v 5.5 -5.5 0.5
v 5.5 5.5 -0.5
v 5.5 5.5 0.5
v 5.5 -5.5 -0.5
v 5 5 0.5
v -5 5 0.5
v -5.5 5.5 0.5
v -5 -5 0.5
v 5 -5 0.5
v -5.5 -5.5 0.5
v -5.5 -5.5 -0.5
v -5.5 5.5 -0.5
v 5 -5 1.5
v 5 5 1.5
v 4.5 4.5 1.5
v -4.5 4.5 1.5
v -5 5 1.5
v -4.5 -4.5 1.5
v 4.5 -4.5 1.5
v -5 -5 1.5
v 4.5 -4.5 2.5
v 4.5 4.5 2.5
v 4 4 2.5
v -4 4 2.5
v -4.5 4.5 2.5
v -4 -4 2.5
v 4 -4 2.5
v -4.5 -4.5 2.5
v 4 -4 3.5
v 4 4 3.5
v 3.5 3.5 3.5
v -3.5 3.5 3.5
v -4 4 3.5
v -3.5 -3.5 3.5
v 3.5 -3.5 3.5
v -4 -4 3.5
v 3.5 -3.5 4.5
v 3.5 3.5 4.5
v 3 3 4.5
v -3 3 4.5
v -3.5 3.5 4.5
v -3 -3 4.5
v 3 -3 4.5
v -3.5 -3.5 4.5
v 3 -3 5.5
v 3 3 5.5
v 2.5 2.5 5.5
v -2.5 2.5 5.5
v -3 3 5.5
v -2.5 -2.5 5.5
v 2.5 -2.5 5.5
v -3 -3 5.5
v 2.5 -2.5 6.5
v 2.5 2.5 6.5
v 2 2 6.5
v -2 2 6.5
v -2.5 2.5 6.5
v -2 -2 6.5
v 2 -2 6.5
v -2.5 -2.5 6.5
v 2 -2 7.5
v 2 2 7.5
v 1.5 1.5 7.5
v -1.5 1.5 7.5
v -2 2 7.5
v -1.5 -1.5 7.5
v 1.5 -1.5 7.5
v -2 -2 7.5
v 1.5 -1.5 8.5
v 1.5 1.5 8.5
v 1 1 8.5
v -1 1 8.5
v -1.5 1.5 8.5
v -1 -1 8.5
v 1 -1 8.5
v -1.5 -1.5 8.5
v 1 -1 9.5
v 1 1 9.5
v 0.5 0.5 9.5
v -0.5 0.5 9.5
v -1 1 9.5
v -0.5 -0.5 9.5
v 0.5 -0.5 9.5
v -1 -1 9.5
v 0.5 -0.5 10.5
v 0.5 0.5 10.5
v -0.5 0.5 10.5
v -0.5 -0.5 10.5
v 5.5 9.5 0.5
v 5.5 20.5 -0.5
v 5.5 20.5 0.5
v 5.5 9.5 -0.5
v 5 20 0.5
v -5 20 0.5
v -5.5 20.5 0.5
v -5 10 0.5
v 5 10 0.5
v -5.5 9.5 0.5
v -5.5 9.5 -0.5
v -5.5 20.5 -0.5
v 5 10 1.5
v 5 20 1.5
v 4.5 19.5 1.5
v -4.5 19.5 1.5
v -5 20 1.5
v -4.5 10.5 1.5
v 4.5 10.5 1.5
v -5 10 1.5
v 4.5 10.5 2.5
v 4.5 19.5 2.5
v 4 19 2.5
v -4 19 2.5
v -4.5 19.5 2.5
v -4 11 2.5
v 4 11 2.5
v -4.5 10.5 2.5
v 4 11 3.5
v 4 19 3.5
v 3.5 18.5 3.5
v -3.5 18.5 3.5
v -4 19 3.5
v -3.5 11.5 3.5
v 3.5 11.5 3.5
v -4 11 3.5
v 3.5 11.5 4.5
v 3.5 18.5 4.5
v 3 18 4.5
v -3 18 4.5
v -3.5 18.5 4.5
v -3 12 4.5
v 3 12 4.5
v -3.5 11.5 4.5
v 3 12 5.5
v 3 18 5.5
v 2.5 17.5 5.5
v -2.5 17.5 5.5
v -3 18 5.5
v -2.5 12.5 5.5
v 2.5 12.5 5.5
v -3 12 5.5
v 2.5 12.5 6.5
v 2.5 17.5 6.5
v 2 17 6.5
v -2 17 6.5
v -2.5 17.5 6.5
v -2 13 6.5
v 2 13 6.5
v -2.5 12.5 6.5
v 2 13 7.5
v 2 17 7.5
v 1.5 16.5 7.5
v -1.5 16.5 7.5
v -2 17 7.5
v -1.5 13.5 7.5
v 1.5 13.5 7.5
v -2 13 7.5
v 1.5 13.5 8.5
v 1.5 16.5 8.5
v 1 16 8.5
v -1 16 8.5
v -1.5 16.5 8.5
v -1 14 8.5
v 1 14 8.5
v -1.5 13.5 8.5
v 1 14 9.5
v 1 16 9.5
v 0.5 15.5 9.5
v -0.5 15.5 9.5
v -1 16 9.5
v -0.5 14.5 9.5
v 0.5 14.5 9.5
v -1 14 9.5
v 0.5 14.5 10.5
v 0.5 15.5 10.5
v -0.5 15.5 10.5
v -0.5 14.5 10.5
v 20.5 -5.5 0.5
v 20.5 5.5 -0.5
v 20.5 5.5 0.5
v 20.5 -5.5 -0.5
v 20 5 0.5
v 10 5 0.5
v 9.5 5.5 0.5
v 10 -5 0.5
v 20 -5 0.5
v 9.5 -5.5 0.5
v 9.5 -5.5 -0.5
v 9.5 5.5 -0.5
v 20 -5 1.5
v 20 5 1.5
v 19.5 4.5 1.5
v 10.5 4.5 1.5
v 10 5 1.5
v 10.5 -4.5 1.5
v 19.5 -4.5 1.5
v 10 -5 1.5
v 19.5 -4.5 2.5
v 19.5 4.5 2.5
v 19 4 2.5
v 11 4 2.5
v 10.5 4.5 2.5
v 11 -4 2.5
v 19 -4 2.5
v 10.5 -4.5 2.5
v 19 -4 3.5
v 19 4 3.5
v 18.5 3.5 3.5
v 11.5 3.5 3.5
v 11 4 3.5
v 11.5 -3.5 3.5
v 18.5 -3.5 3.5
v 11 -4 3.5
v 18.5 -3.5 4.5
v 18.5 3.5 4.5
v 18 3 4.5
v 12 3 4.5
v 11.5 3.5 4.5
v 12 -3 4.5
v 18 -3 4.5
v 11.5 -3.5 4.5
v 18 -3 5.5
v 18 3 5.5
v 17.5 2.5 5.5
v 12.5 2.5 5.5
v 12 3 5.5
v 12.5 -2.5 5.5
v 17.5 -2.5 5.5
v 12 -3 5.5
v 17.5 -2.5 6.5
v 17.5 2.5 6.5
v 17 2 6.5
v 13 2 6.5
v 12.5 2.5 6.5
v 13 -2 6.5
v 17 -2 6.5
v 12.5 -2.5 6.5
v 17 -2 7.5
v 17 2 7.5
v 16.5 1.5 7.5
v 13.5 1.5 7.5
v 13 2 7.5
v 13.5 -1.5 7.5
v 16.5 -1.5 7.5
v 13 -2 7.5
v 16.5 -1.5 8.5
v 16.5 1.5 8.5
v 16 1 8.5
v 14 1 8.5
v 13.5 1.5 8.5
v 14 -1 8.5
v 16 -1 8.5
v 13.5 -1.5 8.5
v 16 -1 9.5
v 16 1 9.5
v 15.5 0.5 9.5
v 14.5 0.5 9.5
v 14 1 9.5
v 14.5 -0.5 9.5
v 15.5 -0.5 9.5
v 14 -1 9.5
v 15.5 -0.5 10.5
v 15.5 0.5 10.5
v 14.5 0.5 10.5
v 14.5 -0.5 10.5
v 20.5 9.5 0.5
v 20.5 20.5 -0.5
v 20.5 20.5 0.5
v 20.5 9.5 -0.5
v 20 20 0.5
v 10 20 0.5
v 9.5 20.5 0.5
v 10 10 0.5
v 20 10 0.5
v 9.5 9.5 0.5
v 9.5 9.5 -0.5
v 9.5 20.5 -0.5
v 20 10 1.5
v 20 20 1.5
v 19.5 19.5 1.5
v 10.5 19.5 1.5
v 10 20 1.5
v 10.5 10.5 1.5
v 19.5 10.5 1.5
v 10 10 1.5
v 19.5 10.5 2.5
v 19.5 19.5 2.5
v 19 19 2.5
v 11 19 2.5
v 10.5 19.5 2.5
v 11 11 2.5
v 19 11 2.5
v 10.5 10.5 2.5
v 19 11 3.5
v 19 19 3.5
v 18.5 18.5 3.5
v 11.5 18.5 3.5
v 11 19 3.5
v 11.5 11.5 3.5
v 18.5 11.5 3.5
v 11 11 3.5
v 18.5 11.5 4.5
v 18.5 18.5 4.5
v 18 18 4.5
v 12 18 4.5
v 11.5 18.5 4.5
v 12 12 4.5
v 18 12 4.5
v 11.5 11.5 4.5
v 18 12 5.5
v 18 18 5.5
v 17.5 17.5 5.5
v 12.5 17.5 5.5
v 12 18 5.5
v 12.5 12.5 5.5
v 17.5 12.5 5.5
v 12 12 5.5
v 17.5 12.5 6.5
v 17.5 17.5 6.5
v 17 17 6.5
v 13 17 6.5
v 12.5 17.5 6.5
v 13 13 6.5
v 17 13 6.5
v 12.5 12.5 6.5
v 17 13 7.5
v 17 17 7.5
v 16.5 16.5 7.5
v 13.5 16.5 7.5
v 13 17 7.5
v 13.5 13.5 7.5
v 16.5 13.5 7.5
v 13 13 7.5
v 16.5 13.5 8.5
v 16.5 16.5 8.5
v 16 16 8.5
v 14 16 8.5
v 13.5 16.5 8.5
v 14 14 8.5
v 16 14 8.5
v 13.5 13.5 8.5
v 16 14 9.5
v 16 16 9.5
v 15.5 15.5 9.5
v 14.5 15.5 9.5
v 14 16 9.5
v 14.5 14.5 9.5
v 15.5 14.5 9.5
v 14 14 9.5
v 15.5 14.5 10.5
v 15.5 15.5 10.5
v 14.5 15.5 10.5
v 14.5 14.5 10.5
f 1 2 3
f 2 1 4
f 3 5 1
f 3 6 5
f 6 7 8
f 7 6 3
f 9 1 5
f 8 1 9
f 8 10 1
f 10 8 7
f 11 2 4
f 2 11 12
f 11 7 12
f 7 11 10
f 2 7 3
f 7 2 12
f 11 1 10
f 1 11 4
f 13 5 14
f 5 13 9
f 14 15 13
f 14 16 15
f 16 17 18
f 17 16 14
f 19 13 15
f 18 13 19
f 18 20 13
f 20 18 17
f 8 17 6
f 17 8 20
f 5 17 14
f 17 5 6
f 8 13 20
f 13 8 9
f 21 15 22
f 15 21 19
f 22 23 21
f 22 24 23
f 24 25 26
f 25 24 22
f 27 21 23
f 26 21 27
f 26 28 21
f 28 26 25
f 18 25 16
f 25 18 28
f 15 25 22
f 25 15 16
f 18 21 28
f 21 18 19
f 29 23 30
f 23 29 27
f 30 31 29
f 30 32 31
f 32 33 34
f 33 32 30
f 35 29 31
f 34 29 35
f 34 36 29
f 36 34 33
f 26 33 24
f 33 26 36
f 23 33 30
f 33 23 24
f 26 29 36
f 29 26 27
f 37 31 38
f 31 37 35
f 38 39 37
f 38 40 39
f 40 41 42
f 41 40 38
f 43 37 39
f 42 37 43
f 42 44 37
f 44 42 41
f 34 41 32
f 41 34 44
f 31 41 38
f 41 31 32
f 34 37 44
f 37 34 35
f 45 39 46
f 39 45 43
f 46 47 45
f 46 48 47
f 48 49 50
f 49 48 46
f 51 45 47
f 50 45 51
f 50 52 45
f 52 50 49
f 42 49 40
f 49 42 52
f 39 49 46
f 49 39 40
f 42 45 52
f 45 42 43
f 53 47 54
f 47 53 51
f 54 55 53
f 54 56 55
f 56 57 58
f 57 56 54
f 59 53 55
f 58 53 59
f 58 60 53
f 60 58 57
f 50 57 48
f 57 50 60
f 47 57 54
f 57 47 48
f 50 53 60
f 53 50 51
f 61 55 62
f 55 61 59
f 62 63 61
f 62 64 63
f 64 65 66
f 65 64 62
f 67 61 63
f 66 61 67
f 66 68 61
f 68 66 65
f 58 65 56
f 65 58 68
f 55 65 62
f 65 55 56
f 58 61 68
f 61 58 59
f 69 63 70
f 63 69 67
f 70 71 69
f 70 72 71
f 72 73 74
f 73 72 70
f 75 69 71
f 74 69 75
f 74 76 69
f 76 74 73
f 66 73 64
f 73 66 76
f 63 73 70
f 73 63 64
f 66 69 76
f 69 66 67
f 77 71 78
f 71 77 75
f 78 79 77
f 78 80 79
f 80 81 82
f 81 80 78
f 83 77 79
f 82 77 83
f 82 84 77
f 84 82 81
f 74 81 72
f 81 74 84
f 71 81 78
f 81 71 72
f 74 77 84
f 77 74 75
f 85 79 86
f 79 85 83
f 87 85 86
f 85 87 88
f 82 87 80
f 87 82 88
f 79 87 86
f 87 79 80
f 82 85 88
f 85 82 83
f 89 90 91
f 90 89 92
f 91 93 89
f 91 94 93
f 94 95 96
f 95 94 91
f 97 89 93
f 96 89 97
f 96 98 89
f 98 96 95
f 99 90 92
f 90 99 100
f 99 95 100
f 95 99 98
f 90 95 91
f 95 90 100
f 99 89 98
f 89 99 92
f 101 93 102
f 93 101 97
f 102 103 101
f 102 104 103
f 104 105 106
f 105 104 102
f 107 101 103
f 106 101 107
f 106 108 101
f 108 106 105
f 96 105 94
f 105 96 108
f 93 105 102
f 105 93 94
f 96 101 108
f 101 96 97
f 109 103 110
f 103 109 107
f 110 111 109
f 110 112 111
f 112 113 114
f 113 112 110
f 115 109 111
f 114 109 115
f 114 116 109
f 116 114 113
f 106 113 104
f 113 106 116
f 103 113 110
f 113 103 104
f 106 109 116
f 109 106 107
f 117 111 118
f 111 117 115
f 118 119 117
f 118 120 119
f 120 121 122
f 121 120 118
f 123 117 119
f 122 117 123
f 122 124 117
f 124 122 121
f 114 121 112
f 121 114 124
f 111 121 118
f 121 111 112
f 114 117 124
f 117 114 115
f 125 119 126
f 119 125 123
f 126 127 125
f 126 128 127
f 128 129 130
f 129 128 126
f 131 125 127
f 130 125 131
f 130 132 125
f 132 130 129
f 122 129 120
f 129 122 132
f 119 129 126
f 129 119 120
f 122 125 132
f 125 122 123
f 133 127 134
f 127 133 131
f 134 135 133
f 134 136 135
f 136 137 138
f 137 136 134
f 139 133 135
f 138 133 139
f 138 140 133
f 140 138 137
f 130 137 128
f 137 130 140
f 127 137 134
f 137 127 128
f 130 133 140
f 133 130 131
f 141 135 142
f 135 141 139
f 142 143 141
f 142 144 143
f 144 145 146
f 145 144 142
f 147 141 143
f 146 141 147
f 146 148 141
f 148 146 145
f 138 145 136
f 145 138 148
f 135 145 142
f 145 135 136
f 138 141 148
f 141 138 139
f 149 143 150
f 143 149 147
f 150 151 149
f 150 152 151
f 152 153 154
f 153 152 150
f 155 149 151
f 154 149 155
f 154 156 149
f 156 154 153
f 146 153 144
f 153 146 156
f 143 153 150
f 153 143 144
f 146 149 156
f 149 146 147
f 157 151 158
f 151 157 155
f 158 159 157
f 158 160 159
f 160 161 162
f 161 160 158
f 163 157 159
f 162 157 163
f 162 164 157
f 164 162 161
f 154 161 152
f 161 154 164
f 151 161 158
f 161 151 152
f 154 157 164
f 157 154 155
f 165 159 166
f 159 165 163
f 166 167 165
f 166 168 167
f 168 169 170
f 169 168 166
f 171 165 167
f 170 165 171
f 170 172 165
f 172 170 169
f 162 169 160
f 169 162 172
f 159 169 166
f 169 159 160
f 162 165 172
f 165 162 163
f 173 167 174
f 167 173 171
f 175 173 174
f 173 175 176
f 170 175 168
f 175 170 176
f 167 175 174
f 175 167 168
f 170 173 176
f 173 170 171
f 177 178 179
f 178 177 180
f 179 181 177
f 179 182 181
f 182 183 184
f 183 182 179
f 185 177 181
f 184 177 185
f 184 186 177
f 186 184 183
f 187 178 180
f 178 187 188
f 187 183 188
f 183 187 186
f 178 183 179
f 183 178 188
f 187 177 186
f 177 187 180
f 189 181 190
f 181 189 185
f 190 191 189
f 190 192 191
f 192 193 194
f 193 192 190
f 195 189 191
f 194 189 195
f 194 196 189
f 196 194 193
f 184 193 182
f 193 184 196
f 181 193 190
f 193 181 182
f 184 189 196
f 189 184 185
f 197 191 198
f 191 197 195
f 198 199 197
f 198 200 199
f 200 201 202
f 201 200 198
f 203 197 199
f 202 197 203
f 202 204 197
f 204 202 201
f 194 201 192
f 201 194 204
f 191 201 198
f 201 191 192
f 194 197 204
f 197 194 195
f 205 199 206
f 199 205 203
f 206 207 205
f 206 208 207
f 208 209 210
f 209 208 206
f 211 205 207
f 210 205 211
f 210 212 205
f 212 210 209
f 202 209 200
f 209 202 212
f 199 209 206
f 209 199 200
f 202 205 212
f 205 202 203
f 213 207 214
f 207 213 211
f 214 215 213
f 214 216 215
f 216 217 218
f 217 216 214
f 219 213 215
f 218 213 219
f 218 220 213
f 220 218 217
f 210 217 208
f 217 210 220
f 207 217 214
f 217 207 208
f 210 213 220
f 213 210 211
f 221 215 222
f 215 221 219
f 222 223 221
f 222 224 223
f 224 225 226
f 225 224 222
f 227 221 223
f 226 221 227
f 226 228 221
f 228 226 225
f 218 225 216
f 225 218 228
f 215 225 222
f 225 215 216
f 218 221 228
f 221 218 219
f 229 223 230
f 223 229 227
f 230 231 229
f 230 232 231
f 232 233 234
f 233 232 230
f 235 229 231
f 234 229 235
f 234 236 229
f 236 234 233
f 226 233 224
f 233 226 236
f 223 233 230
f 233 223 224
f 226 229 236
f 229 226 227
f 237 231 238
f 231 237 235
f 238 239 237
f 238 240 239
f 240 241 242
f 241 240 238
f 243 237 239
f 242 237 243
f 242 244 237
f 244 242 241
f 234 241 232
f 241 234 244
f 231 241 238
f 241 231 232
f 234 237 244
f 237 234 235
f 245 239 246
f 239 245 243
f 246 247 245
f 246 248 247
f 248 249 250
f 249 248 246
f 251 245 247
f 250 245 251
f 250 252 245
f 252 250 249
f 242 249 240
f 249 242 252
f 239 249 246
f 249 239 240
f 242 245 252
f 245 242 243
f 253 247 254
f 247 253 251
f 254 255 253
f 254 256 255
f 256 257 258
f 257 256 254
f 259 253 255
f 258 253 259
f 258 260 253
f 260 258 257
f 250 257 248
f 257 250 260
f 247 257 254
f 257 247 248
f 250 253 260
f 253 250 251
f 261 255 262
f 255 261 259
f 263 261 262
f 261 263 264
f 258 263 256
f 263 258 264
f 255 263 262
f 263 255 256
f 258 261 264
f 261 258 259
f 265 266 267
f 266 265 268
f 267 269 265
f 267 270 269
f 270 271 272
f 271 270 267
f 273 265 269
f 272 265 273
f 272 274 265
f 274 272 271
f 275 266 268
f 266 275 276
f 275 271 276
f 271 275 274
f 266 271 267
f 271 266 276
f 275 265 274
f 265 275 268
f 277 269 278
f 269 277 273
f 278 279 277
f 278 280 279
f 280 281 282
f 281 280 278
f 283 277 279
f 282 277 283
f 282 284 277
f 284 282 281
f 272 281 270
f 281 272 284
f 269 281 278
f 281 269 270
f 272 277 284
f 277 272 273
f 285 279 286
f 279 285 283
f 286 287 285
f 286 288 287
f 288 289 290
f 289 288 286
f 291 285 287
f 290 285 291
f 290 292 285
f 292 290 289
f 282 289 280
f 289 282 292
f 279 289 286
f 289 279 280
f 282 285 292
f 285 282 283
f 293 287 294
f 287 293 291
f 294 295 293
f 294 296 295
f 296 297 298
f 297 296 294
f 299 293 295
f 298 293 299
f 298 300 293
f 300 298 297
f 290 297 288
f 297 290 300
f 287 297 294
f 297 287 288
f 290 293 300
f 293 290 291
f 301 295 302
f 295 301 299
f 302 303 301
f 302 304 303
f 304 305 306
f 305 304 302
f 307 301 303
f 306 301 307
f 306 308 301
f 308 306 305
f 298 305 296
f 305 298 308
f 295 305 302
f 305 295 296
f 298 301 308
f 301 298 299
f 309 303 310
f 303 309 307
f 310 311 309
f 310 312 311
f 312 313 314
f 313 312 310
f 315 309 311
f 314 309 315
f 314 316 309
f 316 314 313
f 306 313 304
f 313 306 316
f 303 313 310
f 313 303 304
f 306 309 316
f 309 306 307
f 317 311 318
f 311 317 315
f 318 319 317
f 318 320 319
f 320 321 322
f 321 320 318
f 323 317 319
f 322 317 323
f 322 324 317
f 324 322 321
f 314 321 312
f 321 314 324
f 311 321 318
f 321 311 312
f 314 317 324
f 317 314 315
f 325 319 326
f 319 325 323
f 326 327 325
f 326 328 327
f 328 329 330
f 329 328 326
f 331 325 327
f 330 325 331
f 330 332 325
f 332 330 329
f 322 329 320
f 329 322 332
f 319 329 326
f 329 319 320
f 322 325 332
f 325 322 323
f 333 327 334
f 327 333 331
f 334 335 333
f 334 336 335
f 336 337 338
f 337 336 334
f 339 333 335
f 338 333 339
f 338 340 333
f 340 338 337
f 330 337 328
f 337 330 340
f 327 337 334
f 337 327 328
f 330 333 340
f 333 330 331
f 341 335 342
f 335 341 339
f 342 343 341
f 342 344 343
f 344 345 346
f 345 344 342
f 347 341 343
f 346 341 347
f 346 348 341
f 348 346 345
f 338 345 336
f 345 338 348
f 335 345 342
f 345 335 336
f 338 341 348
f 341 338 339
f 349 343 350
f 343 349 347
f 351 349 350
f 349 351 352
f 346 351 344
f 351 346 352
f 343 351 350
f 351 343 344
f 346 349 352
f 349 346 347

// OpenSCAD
//use this to convert hue-saturation-value colors to red-green-blue colors for use with OpenSCAD's color() module
//Rainbows are much easier to  make now!

/****************************************************/
/*						How to Use					*/
/****************************************************/

//use the hsvToRGB function to convert hsv colors to rgb colors
//it takes 4 parameters:
//	h is a value from 0.0 to 1.0 and represents hue which is the type of color (red, green, blue, orange, yellow, etc)
//		0.0 is red
//		0.33 is green
//		0.66 is blue
//	s is a value from 0.0 to 1.0 and controls saturation which is how 'rich' the color is
//	v is a value from 0.0 to 1.0 and controls the value of the color which is how bright the color is
//	a is a value from 0.0 to 1.0 and controls how transparent the color is

//parameters will default to 1.0 if they are not set

/****************************************************/
/*						Example						*/
/****************************************************/

//changing hue
for(i = [0:10])
{
	color(hsvToRGB(1 / 10 * i, 1, 1, 1))
		translate([0,0,1 * i])
			cube([11 - i,11 - i,1], center = true);
}

//changing saturation
translate([0,15,0])
for(i = [0:10])
{
	color(hsvToRGB(1, 1 / 10 * i, 1, 1))
		translate([0,0,1 * i])
			cube([11 - i,11 - i,1], center = true);
}

//changing value
translate([15,0,0])
for(i = [0:10])
{
	color(hsvToRGB(1, 1, 1 / 10 * i, 1))
		translate([0,0,1 * i])
			cube([11 - i,11 - i,1], center = true);
}

//changing alpha
translate([15,15,0])
for(i = [0:10])
{
	color(hsvToRGB(1, 1, 1, 1 / 10 * i))
		translate([0,0,1 * i])
			cube([11 - i,11 - i,1], center = true);
}


/****************************************************/
/*				Modules and Functions				*/
/****************************************************/

function hsvToRGB(h = 1, s = 1, v = 1, a = 1) =	[
													hsvToPreRGB(h, s, v, a)[0] + hsvToMin(h, s, v, a),
													hsvToPreRGB(h, s, v, a)[1] + hsvToMin(h, s, v, a),
													hsvToPreRGB(h, s, v, a)[2] + hsvToMin(h, s, v, a),
													a
												];


function hsvToChroma(h, s, v, a) = s * v;

function hsvToHdash(h, s, v, a) = h * 360 / 60;

function hsvToX(h, s, v, a) = hsvToChroma(h, s, v, a) * (1.0 - abs((hsvToHdash(h, s, v, a) % 2.0) - 1.0));

function hsvToMin(h, s, v, a) = v - hsvToChroma(h, s, v, a);

function hsvToPreRGB(h, s, v, a) = 	hsvToHdash(h, s, v, a) < 1.0 ? [hsvToChroma(h, s, v, a), hsvToX(h, s, v, a), 0, a] :
									hsvToHdash(h, s, v, a) < 2.0 ? [hsvToX(h, s, v, a), hsvToChroma(h, s, v, a), 0, a] :
									hsvToHdash(h, s, v, a) < 3.0 ? [0, hsvToChroma(h, s, v, a), hsvToX(h, s, v, a), a] :
									hsvToHdash(h, s, v, a) < 4.0 ? [0, hsvToX(h, s, v, a), hsvToChroma(h, s, v, a), a] :
									hsvToHdash(h, s, v, a) < 5.0 ? [hsvToX(h, s, v, a), 0, hsvToChroma(h, s, v, a), a] :
									[hsvToChroma(h, s, v, a), 0, hsvToX(h, s, v, a), a];
